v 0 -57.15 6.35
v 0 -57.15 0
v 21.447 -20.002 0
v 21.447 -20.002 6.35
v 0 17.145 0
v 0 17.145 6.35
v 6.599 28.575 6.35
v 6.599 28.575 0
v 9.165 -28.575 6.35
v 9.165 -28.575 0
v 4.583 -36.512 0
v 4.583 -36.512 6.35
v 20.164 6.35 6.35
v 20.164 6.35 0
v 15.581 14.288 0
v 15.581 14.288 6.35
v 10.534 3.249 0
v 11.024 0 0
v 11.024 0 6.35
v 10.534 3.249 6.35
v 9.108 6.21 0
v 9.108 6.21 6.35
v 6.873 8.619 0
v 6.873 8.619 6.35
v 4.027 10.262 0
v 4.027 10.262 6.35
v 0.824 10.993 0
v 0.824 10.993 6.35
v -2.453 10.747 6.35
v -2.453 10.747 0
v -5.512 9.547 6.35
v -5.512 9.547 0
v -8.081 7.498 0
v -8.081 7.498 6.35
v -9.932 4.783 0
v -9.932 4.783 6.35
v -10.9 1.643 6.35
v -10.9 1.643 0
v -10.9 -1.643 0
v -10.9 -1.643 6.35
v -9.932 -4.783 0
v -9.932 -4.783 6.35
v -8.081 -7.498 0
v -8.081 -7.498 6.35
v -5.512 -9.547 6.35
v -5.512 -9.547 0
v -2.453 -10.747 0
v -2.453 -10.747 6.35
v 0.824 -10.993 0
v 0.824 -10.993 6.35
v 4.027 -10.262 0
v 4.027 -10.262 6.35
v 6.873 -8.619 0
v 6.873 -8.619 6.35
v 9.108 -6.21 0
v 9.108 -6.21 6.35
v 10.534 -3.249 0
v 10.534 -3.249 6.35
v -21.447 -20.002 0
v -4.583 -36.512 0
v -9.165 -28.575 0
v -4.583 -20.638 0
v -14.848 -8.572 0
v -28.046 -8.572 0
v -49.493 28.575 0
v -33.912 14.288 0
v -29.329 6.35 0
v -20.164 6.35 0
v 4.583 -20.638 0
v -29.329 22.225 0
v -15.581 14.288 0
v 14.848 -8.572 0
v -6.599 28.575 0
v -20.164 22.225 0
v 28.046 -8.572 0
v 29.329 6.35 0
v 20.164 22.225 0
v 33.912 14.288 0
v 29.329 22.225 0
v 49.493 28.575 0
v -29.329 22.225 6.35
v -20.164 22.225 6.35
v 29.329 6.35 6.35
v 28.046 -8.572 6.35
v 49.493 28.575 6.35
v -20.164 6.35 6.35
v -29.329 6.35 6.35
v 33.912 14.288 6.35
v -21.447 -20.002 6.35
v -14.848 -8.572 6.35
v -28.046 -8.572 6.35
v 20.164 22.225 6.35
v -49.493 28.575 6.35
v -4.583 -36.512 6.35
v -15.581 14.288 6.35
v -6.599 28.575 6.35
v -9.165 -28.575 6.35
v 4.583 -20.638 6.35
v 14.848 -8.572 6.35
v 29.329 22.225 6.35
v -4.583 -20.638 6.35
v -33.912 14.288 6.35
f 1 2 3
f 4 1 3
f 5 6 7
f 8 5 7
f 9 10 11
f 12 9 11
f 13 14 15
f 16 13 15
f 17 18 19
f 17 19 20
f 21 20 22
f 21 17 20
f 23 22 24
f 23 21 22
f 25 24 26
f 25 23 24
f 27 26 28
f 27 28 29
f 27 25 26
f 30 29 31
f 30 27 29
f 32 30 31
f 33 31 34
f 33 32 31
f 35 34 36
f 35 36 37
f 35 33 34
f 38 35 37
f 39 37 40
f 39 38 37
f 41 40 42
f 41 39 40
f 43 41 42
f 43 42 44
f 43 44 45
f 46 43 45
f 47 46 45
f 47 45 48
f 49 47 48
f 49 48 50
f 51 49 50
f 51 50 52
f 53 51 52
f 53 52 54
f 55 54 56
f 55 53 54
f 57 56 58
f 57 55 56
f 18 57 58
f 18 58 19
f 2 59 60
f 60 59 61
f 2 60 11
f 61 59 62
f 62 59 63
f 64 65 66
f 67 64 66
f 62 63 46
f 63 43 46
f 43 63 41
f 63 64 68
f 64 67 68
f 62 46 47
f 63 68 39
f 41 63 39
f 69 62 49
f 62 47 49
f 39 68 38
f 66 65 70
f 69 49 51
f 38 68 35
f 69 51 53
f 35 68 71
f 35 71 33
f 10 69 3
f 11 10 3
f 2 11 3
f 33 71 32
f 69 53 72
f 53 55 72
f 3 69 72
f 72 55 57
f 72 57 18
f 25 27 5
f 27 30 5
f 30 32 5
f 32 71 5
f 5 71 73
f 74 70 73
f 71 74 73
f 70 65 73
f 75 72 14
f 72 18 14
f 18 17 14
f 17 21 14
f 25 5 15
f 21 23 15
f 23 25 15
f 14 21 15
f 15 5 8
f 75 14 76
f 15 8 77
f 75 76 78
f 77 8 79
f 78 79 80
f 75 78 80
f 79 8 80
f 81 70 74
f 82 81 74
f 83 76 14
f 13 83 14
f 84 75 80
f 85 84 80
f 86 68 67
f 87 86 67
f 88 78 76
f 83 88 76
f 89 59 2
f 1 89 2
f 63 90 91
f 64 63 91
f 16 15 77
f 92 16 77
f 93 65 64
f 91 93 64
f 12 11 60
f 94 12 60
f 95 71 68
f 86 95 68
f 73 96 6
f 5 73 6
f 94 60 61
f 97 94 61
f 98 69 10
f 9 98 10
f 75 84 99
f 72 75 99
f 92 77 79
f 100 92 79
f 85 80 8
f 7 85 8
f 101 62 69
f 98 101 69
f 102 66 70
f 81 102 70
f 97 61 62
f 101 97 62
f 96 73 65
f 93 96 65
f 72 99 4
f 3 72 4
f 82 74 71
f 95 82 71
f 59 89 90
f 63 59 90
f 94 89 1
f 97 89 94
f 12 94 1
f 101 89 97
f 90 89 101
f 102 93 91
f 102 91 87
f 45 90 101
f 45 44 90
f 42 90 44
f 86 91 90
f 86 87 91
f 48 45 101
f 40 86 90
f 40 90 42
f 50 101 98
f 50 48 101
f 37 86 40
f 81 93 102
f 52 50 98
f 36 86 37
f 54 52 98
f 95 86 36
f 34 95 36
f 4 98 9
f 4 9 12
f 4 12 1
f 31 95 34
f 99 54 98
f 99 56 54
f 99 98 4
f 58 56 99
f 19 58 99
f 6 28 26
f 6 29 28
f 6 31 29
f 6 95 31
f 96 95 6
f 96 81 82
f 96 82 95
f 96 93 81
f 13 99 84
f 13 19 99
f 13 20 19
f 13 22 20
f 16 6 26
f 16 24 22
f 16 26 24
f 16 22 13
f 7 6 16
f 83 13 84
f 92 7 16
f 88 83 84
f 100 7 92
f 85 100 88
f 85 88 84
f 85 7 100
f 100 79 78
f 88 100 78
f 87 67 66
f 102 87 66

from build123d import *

# Parameters (mm, degrees)
F0_R     = 11.0236
F1_DEPTH = 6.35
F3_DEPTH = 6.35


with BuildPart() as f1:
    # F0 (on Top) → F1 (new body)
    with BuildSketch(Plane.XY):
        Polygon((0, -57.15), (24.7466759131, -14.2875), (-24.7466759131, -14.2875), align=None)
        Polygon((-4.5827177617, -36.5125), (-9.1654355234, -28.575), (-4.5827177617, -20.6375), (4.5827177617, -20.6375), (9.1654355234, -28.575), (4.5827177617, -36.5125), align=None, mode=Mode.SUBTRACT)
        Polygon((-24.7466759131, -14.2875), (24.7466759131, -14.2875), (0, 28.575), align=None)
        Circle(F0_R, mode=Mode.SUBTRACT)
        Polygon((0, 28.575), (24.7466759131, -14.2875), (49.4933518263, 28.575), align=None)
        Polygon((33.9121114365, 14.2875), (29.3293936748, 6.35), (20.1639581514, 6.35), (15.5812403898, 14.2875), (20.1639581514, 22.225), (29.3293936748, 22.225), align=None, mode=Mode.SUBTRACT)
        Polygon((-49.4933518263, 28.575), (-24.7466759131, -14.2875), (0, 28.575), align=None)
        Polygon((-20.1639581514, 22.225), (-15.5812403898, 14.2875), (-20.1639581514, 6.35), (-29.3293936748, 6.35), (-33.9121114365, 14.2875), (-29.3293936748, 22.225), align=None, mode=Mode.SUBTRACT)
    extrude(amount=F1_DEPTH)

    # F2 (on face) → F3 (cut)
    with BuildSketch(Plane.XY.offset(6.35)):
        Polygon((6.5991135768, 28.575), (-6.5991135768, 28.575), (0, 17.145), align=None)
        Polygon((-14.8480055479, -8.5725), (-28.0462327016, -8.5725), (-21.4471191247, -20.0025), align=None)
        Polygon((21.4471191247, -20.0025), (28.0462327016, -8.5725), (14.8480055479, -8.5725), align=None)
    extrude(amount=-F3_DEPTH, mode=Mode.SUBTRACT)


solid = f1.part
